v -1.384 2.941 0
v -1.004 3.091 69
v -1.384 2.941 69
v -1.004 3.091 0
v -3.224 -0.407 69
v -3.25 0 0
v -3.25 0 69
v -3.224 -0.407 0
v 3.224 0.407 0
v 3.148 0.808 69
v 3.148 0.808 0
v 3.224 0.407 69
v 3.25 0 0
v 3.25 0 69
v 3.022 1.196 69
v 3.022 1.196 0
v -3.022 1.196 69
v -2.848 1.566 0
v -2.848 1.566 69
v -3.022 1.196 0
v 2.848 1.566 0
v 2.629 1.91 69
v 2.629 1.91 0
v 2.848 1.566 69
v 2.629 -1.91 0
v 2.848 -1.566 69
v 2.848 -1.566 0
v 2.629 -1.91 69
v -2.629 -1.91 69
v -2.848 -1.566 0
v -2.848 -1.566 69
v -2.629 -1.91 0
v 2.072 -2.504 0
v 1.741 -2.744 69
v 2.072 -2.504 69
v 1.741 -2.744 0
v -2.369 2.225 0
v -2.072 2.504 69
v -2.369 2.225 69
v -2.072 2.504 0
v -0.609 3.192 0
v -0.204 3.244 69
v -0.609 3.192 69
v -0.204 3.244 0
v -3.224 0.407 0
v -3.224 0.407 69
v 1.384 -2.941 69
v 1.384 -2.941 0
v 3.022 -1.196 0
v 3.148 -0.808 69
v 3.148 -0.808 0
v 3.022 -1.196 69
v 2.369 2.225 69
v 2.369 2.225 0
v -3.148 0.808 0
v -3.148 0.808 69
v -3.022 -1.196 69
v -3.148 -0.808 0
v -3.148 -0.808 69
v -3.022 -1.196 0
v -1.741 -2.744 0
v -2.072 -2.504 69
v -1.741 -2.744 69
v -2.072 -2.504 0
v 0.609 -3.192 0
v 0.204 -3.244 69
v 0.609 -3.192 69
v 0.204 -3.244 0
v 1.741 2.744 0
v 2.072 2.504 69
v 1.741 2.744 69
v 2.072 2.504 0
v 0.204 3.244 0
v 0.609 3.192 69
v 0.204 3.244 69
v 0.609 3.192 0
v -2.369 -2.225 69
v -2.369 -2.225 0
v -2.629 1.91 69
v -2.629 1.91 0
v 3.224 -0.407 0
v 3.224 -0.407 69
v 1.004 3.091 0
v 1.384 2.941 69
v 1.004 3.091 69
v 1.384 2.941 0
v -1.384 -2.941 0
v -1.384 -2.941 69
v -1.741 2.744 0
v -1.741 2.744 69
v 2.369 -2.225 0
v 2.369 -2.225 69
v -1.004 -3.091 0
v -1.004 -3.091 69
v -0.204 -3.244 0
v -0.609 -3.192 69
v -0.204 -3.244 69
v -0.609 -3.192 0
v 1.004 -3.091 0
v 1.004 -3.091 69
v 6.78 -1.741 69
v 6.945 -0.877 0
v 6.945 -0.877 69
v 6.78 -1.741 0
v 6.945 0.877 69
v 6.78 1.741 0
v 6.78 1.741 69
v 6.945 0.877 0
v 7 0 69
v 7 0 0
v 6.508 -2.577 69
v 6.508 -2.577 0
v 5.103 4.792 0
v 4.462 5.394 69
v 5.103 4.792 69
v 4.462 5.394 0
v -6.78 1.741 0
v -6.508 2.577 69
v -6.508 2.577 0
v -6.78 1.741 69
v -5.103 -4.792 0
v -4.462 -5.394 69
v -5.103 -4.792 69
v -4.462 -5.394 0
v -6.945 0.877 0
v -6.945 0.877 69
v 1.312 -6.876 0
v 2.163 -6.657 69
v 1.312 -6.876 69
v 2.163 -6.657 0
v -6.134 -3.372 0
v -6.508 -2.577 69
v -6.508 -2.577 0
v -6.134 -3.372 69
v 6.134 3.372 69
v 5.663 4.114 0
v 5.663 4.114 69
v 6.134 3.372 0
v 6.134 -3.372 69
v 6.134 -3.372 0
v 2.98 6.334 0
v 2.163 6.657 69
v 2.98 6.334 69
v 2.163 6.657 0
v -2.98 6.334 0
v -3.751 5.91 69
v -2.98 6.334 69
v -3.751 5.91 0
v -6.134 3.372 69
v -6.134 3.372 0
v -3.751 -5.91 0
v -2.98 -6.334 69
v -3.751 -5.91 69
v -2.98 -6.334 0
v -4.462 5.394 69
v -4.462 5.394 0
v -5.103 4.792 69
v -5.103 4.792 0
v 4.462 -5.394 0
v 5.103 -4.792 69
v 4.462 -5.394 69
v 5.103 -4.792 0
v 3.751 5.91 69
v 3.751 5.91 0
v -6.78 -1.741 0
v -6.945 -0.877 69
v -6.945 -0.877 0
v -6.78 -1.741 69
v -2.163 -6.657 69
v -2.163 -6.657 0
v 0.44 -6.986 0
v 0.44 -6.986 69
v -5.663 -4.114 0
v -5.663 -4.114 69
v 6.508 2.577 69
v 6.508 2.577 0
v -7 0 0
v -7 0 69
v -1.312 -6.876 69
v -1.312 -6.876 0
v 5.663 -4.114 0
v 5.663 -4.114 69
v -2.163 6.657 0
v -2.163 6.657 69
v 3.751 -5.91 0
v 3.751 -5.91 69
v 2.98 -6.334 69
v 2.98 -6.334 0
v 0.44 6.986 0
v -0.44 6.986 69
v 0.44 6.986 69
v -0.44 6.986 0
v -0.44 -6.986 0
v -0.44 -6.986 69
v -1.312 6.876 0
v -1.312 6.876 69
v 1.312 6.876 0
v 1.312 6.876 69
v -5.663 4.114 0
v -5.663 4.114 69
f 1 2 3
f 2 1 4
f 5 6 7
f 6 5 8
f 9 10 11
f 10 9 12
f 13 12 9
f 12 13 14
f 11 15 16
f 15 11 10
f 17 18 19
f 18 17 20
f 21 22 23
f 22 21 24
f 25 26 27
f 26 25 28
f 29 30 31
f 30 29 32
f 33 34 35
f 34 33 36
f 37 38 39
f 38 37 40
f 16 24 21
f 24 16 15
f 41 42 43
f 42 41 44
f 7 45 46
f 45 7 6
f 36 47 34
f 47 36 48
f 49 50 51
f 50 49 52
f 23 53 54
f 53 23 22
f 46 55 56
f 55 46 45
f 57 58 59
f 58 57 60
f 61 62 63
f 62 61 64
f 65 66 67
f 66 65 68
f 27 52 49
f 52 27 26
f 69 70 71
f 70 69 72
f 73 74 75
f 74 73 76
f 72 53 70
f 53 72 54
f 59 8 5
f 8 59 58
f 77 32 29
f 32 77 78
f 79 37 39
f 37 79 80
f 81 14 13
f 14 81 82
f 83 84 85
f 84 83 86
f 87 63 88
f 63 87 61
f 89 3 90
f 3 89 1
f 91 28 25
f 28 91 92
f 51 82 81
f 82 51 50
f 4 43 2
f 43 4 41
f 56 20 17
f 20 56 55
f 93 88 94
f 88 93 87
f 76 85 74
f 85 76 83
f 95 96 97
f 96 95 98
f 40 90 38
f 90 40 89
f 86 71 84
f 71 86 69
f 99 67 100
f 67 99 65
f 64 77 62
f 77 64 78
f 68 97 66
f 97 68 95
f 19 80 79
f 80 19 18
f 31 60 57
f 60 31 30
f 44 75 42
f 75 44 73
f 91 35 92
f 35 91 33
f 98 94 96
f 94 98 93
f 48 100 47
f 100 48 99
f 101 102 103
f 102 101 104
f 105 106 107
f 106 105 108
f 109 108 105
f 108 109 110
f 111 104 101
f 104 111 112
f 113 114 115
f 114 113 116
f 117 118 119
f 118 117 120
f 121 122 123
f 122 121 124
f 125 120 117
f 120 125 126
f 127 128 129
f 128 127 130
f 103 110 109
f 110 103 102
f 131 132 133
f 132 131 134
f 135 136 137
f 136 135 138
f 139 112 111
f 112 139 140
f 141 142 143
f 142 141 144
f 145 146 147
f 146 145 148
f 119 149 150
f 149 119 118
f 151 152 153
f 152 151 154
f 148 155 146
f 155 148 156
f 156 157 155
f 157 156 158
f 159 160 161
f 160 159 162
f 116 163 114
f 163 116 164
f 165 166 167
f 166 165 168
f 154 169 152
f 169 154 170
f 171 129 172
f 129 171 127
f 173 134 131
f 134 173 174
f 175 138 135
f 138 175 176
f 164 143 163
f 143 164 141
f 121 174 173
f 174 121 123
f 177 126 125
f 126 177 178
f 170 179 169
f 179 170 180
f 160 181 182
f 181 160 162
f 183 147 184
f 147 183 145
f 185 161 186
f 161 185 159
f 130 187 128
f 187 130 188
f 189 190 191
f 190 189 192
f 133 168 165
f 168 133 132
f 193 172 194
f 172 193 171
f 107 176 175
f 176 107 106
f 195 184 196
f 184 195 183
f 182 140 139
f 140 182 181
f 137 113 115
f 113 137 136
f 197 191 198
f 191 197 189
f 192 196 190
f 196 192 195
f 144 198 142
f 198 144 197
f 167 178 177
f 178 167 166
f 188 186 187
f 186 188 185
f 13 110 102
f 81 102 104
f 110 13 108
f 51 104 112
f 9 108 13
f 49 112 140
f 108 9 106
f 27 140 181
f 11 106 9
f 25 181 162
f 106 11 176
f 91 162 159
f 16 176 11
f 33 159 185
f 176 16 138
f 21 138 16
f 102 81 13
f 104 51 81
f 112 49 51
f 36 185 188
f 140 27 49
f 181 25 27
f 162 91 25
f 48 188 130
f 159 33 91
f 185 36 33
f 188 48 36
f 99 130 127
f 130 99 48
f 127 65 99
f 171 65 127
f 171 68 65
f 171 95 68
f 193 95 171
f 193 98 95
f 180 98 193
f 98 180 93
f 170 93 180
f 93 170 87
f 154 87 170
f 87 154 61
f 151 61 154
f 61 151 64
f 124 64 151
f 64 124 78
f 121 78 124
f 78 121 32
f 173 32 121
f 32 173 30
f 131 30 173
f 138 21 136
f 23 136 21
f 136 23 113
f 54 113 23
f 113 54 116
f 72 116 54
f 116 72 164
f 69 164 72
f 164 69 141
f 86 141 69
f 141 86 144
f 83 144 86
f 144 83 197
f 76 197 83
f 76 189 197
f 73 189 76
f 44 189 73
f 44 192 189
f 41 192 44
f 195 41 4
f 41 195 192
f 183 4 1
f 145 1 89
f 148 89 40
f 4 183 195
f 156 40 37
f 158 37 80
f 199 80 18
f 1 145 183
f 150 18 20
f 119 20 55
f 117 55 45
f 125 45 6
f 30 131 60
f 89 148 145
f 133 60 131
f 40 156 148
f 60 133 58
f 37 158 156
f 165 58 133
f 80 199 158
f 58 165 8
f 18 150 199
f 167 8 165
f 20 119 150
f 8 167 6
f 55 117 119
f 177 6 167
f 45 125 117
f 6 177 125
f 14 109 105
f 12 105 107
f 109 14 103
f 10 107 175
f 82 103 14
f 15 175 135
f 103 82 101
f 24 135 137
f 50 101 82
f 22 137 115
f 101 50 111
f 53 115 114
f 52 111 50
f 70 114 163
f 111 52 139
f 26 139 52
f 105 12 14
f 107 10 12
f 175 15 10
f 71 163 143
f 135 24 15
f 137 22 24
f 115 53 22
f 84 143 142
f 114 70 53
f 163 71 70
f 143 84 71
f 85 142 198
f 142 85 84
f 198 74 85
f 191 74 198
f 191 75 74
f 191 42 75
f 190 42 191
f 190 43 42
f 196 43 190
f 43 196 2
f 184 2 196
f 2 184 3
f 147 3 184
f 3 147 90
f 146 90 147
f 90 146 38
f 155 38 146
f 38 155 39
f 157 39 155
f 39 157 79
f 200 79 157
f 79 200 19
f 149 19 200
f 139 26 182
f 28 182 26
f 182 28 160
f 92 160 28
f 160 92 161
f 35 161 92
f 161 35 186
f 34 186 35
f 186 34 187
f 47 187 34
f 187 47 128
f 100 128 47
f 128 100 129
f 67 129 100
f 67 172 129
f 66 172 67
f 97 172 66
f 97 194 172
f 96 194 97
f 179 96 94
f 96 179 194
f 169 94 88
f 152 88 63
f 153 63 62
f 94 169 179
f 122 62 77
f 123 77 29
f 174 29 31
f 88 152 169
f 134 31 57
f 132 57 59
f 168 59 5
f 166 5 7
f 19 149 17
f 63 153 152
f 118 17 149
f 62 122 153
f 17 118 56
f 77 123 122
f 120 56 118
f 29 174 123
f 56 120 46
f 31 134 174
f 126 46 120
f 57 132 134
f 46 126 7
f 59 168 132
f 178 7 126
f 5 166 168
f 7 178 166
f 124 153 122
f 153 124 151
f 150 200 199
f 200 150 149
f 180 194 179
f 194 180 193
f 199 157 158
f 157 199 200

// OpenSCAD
$fn = 50;


difference() {
	union() {
		cylinder(h = 69, r = 7.0000000000);
	}
	union() {
		translate(v = [0.0000000000, 0.0000000000, -100.0000000000]) {
			cylinder(h = 200, r = 3.2500000000);
		}
		cylinder(h = 69, r = 1.8000000000);
		cylinder(h = 69, r = 1.8000000000);
		cylinder(h = 69, r = 1.8000000000);
	}
}
